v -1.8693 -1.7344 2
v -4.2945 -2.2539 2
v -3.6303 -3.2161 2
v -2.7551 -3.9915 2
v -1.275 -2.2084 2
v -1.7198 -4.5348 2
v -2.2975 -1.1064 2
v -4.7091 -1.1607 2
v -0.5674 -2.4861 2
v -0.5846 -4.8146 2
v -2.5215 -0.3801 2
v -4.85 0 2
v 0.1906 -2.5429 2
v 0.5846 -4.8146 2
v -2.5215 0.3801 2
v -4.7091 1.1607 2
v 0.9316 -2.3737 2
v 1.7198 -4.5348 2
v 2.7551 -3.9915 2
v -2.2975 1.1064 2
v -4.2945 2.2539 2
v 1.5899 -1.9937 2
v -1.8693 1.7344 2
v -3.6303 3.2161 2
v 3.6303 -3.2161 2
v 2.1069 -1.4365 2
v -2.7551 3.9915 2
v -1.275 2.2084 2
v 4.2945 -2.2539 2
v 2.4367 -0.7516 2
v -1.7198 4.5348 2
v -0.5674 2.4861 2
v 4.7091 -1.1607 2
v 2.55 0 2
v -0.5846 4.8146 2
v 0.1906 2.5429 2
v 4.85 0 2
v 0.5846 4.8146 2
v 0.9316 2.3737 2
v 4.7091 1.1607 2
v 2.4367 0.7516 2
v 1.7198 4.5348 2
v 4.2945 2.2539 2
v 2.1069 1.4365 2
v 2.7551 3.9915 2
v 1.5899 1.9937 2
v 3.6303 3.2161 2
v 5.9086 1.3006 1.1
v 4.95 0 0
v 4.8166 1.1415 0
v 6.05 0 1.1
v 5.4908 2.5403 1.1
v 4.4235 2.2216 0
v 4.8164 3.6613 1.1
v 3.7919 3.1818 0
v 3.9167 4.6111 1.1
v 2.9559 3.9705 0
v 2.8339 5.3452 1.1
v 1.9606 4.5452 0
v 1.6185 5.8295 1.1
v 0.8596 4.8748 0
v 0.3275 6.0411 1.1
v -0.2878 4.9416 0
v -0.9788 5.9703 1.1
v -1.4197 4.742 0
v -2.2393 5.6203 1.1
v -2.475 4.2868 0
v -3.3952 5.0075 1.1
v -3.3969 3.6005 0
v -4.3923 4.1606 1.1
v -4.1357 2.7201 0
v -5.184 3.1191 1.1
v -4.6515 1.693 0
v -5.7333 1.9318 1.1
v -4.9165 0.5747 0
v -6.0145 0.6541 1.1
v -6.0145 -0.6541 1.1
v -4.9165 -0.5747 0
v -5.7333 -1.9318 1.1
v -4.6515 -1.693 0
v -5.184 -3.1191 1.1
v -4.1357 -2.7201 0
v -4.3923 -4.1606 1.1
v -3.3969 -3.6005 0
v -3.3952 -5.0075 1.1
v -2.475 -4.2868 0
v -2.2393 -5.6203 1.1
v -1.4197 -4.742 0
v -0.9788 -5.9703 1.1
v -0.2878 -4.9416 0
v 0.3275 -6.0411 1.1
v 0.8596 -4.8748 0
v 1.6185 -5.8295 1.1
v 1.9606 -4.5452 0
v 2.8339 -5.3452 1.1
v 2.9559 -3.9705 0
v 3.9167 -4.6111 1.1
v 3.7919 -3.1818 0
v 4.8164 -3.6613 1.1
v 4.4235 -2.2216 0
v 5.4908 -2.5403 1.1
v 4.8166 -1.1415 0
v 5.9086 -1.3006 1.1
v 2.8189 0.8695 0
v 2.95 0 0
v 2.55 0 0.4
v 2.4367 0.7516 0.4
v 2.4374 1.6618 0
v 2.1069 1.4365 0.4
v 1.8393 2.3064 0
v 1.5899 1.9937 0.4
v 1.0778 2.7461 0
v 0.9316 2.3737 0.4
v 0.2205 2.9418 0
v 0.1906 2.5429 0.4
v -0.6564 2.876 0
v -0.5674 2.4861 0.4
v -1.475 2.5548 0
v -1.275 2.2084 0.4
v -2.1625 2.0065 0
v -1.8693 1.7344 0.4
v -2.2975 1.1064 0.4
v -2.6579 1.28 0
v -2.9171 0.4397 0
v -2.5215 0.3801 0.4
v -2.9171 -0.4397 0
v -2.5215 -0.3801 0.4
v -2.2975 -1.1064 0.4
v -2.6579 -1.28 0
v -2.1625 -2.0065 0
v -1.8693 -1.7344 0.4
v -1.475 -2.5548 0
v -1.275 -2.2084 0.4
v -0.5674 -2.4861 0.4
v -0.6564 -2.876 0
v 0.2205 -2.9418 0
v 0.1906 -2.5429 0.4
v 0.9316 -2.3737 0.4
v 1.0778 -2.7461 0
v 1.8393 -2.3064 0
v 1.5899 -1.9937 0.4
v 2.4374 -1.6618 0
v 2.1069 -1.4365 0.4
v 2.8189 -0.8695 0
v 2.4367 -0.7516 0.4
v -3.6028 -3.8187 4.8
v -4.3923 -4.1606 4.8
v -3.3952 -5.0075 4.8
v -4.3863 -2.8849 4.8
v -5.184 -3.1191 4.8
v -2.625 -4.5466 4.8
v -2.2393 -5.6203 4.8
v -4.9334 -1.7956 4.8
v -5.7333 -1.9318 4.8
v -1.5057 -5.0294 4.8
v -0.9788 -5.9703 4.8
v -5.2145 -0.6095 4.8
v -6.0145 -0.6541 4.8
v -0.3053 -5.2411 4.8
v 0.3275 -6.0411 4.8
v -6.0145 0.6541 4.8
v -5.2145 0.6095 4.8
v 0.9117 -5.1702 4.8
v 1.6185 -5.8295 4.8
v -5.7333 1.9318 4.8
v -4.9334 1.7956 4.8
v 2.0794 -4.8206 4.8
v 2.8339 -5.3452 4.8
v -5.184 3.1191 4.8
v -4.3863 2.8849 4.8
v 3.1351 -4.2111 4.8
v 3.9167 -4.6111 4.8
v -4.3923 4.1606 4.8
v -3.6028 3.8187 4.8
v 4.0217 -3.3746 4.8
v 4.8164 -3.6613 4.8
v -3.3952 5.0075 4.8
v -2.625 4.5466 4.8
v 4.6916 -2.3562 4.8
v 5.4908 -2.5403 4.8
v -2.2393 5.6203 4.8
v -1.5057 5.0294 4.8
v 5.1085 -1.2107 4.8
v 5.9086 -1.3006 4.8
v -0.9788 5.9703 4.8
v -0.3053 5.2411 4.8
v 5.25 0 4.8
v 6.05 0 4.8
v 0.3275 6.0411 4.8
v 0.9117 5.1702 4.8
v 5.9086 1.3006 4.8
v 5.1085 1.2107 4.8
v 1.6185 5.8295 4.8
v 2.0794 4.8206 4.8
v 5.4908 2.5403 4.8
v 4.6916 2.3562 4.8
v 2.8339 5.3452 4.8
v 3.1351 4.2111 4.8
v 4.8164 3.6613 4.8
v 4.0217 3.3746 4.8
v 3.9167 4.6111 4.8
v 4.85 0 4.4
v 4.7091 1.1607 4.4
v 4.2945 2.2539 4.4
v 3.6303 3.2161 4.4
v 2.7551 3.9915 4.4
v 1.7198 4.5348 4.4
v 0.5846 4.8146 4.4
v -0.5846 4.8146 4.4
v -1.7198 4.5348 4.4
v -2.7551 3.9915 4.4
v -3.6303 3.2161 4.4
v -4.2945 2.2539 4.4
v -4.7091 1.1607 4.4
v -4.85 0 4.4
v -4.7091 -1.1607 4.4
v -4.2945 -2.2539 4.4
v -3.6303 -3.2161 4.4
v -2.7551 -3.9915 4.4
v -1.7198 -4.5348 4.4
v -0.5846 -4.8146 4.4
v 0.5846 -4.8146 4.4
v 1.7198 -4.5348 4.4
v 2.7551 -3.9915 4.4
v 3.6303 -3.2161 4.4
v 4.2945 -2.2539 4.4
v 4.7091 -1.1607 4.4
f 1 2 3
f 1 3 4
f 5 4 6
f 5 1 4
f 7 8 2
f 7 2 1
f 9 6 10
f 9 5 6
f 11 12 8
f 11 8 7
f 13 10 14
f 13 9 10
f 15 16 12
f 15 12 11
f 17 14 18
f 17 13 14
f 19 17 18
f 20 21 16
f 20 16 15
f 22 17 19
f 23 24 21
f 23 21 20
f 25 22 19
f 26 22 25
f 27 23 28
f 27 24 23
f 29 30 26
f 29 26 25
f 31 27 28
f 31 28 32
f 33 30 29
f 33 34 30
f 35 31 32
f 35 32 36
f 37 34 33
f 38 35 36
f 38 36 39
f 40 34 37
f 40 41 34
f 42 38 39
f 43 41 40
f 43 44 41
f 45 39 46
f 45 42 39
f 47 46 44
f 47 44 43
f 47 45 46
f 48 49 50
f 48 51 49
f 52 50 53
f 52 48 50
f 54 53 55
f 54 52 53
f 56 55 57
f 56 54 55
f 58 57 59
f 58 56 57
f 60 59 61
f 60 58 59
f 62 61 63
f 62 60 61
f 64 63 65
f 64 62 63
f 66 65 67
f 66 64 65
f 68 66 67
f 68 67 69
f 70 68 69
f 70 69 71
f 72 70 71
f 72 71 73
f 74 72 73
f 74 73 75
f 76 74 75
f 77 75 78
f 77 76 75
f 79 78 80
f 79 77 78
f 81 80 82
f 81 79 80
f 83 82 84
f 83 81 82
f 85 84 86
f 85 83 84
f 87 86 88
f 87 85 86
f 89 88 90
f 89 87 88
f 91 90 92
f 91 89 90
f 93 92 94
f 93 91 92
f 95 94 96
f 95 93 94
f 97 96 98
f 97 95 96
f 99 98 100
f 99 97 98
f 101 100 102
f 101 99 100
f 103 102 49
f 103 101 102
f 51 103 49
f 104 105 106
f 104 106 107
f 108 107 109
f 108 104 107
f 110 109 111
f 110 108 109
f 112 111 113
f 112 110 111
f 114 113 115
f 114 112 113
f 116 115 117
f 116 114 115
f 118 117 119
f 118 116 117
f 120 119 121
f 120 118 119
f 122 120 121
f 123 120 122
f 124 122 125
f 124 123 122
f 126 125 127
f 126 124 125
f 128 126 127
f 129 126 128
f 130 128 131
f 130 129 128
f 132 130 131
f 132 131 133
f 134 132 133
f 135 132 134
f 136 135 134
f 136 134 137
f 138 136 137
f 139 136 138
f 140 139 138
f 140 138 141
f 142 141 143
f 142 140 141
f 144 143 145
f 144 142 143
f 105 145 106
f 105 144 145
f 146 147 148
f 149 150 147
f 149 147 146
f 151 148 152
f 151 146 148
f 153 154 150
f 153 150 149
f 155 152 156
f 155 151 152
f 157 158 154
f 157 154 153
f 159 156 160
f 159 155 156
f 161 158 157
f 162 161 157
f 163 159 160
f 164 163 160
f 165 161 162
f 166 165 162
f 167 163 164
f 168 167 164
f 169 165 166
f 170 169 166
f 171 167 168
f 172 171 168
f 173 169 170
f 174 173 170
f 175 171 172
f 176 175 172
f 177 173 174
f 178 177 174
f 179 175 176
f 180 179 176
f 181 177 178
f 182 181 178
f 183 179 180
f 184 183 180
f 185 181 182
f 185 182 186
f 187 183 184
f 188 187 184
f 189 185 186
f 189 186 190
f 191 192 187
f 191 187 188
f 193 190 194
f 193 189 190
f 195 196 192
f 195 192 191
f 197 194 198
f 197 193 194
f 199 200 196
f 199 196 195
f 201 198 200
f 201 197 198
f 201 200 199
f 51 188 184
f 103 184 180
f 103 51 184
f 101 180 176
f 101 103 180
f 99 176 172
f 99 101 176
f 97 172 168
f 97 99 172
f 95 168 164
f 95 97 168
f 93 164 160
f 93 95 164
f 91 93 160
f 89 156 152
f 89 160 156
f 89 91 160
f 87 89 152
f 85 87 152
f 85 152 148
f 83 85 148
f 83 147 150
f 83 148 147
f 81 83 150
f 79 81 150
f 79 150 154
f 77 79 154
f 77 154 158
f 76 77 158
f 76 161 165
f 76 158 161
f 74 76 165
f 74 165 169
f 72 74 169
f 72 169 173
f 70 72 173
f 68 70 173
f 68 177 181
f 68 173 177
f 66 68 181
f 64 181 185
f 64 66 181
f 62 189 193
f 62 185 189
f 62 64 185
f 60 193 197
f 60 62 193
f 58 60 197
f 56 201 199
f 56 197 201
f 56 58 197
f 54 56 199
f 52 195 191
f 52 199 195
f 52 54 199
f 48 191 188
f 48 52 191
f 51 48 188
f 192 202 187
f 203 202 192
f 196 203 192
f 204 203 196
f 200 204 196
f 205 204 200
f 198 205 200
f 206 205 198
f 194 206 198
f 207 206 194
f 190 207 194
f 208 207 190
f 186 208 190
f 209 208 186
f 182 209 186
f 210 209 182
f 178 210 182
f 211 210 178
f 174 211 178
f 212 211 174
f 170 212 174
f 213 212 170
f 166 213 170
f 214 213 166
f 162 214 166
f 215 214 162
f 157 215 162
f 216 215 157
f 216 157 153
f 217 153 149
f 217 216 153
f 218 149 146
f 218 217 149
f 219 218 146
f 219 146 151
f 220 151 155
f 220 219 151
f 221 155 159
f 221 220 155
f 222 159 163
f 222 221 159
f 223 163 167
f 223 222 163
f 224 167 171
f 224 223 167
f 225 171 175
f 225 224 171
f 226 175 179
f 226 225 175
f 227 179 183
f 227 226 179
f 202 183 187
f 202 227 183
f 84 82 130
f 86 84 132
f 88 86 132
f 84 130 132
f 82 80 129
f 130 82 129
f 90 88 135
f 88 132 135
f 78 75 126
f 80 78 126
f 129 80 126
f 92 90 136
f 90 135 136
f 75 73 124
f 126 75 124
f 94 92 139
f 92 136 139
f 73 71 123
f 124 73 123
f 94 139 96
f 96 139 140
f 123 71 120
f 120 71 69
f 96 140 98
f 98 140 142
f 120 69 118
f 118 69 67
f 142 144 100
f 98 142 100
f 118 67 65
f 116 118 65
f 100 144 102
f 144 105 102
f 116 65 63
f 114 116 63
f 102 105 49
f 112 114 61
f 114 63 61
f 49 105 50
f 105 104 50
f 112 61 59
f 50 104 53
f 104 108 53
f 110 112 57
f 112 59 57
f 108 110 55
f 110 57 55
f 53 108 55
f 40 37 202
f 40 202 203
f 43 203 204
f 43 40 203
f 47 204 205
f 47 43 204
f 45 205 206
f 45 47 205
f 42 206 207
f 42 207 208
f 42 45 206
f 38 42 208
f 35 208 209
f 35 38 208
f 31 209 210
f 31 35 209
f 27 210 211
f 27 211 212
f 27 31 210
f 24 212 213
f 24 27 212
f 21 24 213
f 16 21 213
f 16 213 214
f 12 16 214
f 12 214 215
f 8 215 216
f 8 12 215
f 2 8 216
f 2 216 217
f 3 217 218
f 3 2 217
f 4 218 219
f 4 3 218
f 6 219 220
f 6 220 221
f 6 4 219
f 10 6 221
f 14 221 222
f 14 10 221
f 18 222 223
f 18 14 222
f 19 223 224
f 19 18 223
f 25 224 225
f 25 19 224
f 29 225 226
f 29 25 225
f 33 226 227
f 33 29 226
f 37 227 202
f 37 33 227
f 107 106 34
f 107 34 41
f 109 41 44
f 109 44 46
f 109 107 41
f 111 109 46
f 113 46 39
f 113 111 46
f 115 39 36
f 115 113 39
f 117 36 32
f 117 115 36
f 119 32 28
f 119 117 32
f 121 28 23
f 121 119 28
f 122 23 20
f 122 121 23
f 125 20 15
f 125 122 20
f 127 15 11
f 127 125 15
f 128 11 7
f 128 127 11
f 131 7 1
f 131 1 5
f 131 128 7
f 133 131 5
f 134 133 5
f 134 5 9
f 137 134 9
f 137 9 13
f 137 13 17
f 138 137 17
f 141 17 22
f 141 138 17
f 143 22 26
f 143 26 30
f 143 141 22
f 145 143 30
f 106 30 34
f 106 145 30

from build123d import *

# Parameters (mm, degrees)
ESQUISSE1_R        = 4.95
ESQUISSE1_R_2      = 2.55
BOSS_EXTRU_1_DEPTH = 2
ESQUISSE2_R        = 6.05
ESQUISSE2_R_2      = 4.85
BOSS_EXTRU_2_DEPTH = 2.8
CHANFREIN1_SIZE    = 2
CHANFREIN2_SIZE    = 0.4


with BuildPart() as part:
    # Esquisse1 → Boss.-Extru.1 (new body)
    with BuildSketch(Plane.XY):
        Circle(ESQUISSE1_R)
        Circle(ESQUISSE1_R_2, mode=Mode.SUBTRACT)
    extrude(amount=BOSS_EXTRU_1_DEPTH)

    # Esquisse2 → Boss.-Extru.2 (add)
    with BuildSketch(Plane.XY.offset(2)):
        Circle(ESQUISSE2_R)
        Circle(ESQUISSE2_R_2, mode=Mode.SUBTRACT)
    extrude(amount=BOSS_EXTRU_2_DEPTH)

    # Chanfrein1
    # the kernel refuses this chamfer: 2 mm, written as the material it adds along each edge
    with BuildSketch(Plane(origin=(0, 0, 2), x_dir=(1, 0, 0), z_dir=(0, -1, 0))) as chanfrein1_piece_1_section:
        Polygon((4.95, -CHANFREIN1_SIZE), (4.95 + CHANFREIN1_SIZE, 0), (4.95, 0), align=None)
    chanfrein1_piece_1 = revolve(axis=Axis((0, 0, 2), (0, 0, 1)), mode=Mode.PRIVATE)
    chanfrein1_piece_1 = split(chanfrein1_piece_1, bisect_by=Plane(origin=(-5.472506069, 0, 0), z_dir=(0, 0, 1)), keep=Keep.TOP, mode=Mode.PRIVATE)
    chanfrein1_piece_1 = chanfrein1_piece_1 & Plane(origin=(0, 0, 0.577493931), x_dir=(1, 0, 0), z_dir=(0, 0, -1)) * Cylinder(6.05, 28, mode=Mode.PRIVATE)
    add(chanfrein1_piece_1)

    # Chanfrein2
    chanfrein2_edges = [part.edges().sort_by_distance(p)[0] for p in [
        (-4.85, 0, 4.8),
        (-2.55, 0, 0),
    ]]
    chamfer(chanfrein2_edges, length=CHANFREIN2_SIZE)


solid = part.part
